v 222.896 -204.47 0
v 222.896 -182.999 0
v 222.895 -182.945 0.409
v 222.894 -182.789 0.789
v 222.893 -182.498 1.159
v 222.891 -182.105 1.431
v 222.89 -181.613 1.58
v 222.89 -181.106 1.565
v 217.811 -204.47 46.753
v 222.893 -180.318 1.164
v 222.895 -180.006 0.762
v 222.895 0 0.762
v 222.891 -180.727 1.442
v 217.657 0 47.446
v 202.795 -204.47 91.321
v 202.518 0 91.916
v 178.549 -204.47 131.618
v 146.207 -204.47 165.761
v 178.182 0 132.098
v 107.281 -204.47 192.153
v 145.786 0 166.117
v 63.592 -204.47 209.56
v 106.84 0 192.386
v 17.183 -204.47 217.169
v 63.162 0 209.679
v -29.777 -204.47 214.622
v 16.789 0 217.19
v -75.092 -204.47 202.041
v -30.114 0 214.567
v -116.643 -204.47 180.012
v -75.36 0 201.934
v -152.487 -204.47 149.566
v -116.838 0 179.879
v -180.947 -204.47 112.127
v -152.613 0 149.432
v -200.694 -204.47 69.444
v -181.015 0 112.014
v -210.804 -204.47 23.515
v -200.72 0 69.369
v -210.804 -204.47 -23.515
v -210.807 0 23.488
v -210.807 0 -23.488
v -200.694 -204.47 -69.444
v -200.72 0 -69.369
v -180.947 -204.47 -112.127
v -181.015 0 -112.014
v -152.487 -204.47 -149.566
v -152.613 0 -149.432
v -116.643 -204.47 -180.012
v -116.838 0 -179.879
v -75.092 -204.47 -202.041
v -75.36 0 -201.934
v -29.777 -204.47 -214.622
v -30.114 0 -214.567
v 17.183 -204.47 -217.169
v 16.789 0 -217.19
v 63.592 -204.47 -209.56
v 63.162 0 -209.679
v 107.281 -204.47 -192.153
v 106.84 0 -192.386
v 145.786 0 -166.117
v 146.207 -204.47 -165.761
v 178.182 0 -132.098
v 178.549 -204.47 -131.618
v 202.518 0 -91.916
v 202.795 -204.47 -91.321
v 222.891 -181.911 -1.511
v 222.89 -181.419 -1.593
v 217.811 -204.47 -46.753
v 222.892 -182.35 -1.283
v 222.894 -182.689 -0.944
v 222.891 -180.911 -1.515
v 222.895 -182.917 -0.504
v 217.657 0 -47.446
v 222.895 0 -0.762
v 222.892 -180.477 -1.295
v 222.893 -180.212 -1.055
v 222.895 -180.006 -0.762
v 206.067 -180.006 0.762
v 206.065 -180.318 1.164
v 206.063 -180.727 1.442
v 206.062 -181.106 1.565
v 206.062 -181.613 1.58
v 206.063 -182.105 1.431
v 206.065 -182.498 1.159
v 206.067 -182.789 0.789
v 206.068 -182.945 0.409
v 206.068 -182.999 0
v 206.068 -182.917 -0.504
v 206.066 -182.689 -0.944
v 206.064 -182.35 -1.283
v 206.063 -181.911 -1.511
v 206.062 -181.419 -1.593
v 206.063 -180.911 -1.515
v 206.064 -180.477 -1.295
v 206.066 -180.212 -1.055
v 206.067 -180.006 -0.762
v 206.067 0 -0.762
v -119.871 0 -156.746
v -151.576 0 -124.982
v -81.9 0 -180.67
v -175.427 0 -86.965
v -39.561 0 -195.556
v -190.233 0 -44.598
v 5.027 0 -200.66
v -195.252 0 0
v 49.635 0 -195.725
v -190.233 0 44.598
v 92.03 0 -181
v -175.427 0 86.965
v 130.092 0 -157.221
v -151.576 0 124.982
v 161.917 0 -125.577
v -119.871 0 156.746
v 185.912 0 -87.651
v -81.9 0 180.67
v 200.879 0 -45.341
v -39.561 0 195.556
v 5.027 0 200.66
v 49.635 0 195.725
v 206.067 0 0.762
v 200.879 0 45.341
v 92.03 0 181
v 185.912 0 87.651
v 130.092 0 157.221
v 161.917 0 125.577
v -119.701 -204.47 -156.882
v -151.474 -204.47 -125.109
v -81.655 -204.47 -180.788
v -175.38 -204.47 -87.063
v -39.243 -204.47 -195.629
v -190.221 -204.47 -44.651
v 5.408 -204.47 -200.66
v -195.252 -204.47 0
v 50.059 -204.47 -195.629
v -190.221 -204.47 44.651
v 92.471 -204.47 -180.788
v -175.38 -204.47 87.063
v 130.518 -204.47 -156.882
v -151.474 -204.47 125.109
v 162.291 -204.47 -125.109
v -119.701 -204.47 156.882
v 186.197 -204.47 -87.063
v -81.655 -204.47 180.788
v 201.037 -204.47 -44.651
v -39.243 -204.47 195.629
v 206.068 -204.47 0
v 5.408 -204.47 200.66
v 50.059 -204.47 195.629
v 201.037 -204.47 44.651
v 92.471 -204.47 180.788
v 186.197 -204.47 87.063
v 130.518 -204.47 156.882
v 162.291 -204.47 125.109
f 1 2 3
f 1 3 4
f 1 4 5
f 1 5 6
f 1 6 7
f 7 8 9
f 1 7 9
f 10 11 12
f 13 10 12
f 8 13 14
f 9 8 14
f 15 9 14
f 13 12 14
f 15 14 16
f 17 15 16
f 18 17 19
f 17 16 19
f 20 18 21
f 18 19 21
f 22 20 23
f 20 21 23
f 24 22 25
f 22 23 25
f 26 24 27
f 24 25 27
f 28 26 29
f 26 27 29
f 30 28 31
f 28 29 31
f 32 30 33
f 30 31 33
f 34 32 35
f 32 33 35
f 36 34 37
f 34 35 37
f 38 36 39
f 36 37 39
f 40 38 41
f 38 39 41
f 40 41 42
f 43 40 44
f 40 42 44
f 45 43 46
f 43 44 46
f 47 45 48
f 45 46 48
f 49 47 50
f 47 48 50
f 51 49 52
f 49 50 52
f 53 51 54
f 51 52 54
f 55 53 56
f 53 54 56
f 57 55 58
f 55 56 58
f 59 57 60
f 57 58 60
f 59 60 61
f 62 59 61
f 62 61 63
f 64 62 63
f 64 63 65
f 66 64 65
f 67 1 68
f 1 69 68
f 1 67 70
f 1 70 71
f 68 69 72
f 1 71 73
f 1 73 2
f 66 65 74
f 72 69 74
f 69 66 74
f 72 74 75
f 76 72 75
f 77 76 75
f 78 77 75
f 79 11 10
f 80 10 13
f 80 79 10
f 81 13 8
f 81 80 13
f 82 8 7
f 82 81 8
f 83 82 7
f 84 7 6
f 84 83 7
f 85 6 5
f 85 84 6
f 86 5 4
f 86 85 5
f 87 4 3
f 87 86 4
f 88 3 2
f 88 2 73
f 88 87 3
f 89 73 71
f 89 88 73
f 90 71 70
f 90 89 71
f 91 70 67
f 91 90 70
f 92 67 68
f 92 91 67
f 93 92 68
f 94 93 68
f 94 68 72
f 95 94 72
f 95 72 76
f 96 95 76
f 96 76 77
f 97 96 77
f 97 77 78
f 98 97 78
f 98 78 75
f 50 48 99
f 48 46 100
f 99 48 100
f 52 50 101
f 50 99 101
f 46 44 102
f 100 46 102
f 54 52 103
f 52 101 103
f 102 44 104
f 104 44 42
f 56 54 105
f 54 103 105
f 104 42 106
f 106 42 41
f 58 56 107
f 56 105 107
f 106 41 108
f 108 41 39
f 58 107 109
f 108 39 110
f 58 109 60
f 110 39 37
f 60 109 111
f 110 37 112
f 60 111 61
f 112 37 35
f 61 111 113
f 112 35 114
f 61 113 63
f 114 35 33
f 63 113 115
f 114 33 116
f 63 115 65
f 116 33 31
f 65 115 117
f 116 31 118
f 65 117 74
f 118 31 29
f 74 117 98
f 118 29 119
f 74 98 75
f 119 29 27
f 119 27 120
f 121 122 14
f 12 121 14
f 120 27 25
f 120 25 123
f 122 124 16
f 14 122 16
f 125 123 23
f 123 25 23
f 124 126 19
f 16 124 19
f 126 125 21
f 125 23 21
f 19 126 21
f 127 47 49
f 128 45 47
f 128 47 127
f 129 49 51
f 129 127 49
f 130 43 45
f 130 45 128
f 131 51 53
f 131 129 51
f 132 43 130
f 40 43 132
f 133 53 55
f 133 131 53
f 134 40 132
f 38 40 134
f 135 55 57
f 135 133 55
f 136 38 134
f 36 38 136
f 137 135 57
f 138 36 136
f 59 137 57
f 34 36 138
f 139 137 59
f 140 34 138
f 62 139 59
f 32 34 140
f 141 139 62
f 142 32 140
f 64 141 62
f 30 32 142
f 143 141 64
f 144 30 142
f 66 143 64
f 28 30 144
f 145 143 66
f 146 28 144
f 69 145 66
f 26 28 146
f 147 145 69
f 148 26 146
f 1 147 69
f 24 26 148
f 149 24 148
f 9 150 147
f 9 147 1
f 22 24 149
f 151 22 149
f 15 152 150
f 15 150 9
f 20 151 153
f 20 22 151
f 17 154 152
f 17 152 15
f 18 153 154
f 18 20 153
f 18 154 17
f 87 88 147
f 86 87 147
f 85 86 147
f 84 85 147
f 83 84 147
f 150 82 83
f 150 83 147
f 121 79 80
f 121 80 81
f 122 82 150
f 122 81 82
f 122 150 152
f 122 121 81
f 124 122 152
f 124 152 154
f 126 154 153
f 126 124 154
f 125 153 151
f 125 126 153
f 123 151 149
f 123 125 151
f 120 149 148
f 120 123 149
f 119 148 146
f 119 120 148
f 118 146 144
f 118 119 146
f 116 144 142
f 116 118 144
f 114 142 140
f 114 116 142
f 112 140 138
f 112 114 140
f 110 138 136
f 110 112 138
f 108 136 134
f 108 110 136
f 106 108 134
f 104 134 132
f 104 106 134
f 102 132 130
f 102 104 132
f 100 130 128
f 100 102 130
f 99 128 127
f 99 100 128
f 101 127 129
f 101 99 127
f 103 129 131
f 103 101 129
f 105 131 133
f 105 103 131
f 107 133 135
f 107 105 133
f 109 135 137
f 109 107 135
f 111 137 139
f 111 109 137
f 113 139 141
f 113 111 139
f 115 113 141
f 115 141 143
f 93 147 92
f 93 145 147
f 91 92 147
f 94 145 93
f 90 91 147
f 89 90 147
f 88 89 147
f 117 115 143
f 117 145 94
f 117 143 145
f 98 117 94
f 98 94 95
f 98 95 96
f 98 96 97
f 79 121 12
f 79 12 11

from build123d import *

# Parameters (mm, degrees)
F0_R     = 8.5625
F0_R_2   = 7.9
F1_DEPTH = 8.05
F3_DEPTH = 25
F5_SCALE = 25.4


with BuildPart() as f1:
    # F0 (on Front) → F1 (new body)
    with BuildSketch(Plane.XZ):
        Circle(F0_R)
        Circle(F0_R_2, mode=Mode.SUBTRACT)
    extrude(amount=F1_DEPTH)

    # F2 (on Right) → F3 (cut)
    with BuildSketch(Plane.YZ):
        with BuildLine():
            Line((0.064567852, 0.03), (0, 0.03))
            Line((0, 0.03), (-7.0868510798, 0.03))
            ThreePointArc((-7.0868510798, 0.03), (-7.204668453, 0), (-7.0868510798, -0.03))
            Line((-7.0868510798, -0.03), (0, -0.03))
            Line((0, -0.03), (0.064567852, -0.0370406015))
            Line((0.064567852, -0.0370406015), (0.064567852, 0.03))
        make_face()
    extrude(amount=F3_DEPTH, mode=Mode.SUBTRACT)


with BuildPart() as f1_1:
    # F5: moved
    add(f1.part.scale(F5_SCALE).moved(Location((5.408359057, 0, 0))))


solid = f1_1.part
